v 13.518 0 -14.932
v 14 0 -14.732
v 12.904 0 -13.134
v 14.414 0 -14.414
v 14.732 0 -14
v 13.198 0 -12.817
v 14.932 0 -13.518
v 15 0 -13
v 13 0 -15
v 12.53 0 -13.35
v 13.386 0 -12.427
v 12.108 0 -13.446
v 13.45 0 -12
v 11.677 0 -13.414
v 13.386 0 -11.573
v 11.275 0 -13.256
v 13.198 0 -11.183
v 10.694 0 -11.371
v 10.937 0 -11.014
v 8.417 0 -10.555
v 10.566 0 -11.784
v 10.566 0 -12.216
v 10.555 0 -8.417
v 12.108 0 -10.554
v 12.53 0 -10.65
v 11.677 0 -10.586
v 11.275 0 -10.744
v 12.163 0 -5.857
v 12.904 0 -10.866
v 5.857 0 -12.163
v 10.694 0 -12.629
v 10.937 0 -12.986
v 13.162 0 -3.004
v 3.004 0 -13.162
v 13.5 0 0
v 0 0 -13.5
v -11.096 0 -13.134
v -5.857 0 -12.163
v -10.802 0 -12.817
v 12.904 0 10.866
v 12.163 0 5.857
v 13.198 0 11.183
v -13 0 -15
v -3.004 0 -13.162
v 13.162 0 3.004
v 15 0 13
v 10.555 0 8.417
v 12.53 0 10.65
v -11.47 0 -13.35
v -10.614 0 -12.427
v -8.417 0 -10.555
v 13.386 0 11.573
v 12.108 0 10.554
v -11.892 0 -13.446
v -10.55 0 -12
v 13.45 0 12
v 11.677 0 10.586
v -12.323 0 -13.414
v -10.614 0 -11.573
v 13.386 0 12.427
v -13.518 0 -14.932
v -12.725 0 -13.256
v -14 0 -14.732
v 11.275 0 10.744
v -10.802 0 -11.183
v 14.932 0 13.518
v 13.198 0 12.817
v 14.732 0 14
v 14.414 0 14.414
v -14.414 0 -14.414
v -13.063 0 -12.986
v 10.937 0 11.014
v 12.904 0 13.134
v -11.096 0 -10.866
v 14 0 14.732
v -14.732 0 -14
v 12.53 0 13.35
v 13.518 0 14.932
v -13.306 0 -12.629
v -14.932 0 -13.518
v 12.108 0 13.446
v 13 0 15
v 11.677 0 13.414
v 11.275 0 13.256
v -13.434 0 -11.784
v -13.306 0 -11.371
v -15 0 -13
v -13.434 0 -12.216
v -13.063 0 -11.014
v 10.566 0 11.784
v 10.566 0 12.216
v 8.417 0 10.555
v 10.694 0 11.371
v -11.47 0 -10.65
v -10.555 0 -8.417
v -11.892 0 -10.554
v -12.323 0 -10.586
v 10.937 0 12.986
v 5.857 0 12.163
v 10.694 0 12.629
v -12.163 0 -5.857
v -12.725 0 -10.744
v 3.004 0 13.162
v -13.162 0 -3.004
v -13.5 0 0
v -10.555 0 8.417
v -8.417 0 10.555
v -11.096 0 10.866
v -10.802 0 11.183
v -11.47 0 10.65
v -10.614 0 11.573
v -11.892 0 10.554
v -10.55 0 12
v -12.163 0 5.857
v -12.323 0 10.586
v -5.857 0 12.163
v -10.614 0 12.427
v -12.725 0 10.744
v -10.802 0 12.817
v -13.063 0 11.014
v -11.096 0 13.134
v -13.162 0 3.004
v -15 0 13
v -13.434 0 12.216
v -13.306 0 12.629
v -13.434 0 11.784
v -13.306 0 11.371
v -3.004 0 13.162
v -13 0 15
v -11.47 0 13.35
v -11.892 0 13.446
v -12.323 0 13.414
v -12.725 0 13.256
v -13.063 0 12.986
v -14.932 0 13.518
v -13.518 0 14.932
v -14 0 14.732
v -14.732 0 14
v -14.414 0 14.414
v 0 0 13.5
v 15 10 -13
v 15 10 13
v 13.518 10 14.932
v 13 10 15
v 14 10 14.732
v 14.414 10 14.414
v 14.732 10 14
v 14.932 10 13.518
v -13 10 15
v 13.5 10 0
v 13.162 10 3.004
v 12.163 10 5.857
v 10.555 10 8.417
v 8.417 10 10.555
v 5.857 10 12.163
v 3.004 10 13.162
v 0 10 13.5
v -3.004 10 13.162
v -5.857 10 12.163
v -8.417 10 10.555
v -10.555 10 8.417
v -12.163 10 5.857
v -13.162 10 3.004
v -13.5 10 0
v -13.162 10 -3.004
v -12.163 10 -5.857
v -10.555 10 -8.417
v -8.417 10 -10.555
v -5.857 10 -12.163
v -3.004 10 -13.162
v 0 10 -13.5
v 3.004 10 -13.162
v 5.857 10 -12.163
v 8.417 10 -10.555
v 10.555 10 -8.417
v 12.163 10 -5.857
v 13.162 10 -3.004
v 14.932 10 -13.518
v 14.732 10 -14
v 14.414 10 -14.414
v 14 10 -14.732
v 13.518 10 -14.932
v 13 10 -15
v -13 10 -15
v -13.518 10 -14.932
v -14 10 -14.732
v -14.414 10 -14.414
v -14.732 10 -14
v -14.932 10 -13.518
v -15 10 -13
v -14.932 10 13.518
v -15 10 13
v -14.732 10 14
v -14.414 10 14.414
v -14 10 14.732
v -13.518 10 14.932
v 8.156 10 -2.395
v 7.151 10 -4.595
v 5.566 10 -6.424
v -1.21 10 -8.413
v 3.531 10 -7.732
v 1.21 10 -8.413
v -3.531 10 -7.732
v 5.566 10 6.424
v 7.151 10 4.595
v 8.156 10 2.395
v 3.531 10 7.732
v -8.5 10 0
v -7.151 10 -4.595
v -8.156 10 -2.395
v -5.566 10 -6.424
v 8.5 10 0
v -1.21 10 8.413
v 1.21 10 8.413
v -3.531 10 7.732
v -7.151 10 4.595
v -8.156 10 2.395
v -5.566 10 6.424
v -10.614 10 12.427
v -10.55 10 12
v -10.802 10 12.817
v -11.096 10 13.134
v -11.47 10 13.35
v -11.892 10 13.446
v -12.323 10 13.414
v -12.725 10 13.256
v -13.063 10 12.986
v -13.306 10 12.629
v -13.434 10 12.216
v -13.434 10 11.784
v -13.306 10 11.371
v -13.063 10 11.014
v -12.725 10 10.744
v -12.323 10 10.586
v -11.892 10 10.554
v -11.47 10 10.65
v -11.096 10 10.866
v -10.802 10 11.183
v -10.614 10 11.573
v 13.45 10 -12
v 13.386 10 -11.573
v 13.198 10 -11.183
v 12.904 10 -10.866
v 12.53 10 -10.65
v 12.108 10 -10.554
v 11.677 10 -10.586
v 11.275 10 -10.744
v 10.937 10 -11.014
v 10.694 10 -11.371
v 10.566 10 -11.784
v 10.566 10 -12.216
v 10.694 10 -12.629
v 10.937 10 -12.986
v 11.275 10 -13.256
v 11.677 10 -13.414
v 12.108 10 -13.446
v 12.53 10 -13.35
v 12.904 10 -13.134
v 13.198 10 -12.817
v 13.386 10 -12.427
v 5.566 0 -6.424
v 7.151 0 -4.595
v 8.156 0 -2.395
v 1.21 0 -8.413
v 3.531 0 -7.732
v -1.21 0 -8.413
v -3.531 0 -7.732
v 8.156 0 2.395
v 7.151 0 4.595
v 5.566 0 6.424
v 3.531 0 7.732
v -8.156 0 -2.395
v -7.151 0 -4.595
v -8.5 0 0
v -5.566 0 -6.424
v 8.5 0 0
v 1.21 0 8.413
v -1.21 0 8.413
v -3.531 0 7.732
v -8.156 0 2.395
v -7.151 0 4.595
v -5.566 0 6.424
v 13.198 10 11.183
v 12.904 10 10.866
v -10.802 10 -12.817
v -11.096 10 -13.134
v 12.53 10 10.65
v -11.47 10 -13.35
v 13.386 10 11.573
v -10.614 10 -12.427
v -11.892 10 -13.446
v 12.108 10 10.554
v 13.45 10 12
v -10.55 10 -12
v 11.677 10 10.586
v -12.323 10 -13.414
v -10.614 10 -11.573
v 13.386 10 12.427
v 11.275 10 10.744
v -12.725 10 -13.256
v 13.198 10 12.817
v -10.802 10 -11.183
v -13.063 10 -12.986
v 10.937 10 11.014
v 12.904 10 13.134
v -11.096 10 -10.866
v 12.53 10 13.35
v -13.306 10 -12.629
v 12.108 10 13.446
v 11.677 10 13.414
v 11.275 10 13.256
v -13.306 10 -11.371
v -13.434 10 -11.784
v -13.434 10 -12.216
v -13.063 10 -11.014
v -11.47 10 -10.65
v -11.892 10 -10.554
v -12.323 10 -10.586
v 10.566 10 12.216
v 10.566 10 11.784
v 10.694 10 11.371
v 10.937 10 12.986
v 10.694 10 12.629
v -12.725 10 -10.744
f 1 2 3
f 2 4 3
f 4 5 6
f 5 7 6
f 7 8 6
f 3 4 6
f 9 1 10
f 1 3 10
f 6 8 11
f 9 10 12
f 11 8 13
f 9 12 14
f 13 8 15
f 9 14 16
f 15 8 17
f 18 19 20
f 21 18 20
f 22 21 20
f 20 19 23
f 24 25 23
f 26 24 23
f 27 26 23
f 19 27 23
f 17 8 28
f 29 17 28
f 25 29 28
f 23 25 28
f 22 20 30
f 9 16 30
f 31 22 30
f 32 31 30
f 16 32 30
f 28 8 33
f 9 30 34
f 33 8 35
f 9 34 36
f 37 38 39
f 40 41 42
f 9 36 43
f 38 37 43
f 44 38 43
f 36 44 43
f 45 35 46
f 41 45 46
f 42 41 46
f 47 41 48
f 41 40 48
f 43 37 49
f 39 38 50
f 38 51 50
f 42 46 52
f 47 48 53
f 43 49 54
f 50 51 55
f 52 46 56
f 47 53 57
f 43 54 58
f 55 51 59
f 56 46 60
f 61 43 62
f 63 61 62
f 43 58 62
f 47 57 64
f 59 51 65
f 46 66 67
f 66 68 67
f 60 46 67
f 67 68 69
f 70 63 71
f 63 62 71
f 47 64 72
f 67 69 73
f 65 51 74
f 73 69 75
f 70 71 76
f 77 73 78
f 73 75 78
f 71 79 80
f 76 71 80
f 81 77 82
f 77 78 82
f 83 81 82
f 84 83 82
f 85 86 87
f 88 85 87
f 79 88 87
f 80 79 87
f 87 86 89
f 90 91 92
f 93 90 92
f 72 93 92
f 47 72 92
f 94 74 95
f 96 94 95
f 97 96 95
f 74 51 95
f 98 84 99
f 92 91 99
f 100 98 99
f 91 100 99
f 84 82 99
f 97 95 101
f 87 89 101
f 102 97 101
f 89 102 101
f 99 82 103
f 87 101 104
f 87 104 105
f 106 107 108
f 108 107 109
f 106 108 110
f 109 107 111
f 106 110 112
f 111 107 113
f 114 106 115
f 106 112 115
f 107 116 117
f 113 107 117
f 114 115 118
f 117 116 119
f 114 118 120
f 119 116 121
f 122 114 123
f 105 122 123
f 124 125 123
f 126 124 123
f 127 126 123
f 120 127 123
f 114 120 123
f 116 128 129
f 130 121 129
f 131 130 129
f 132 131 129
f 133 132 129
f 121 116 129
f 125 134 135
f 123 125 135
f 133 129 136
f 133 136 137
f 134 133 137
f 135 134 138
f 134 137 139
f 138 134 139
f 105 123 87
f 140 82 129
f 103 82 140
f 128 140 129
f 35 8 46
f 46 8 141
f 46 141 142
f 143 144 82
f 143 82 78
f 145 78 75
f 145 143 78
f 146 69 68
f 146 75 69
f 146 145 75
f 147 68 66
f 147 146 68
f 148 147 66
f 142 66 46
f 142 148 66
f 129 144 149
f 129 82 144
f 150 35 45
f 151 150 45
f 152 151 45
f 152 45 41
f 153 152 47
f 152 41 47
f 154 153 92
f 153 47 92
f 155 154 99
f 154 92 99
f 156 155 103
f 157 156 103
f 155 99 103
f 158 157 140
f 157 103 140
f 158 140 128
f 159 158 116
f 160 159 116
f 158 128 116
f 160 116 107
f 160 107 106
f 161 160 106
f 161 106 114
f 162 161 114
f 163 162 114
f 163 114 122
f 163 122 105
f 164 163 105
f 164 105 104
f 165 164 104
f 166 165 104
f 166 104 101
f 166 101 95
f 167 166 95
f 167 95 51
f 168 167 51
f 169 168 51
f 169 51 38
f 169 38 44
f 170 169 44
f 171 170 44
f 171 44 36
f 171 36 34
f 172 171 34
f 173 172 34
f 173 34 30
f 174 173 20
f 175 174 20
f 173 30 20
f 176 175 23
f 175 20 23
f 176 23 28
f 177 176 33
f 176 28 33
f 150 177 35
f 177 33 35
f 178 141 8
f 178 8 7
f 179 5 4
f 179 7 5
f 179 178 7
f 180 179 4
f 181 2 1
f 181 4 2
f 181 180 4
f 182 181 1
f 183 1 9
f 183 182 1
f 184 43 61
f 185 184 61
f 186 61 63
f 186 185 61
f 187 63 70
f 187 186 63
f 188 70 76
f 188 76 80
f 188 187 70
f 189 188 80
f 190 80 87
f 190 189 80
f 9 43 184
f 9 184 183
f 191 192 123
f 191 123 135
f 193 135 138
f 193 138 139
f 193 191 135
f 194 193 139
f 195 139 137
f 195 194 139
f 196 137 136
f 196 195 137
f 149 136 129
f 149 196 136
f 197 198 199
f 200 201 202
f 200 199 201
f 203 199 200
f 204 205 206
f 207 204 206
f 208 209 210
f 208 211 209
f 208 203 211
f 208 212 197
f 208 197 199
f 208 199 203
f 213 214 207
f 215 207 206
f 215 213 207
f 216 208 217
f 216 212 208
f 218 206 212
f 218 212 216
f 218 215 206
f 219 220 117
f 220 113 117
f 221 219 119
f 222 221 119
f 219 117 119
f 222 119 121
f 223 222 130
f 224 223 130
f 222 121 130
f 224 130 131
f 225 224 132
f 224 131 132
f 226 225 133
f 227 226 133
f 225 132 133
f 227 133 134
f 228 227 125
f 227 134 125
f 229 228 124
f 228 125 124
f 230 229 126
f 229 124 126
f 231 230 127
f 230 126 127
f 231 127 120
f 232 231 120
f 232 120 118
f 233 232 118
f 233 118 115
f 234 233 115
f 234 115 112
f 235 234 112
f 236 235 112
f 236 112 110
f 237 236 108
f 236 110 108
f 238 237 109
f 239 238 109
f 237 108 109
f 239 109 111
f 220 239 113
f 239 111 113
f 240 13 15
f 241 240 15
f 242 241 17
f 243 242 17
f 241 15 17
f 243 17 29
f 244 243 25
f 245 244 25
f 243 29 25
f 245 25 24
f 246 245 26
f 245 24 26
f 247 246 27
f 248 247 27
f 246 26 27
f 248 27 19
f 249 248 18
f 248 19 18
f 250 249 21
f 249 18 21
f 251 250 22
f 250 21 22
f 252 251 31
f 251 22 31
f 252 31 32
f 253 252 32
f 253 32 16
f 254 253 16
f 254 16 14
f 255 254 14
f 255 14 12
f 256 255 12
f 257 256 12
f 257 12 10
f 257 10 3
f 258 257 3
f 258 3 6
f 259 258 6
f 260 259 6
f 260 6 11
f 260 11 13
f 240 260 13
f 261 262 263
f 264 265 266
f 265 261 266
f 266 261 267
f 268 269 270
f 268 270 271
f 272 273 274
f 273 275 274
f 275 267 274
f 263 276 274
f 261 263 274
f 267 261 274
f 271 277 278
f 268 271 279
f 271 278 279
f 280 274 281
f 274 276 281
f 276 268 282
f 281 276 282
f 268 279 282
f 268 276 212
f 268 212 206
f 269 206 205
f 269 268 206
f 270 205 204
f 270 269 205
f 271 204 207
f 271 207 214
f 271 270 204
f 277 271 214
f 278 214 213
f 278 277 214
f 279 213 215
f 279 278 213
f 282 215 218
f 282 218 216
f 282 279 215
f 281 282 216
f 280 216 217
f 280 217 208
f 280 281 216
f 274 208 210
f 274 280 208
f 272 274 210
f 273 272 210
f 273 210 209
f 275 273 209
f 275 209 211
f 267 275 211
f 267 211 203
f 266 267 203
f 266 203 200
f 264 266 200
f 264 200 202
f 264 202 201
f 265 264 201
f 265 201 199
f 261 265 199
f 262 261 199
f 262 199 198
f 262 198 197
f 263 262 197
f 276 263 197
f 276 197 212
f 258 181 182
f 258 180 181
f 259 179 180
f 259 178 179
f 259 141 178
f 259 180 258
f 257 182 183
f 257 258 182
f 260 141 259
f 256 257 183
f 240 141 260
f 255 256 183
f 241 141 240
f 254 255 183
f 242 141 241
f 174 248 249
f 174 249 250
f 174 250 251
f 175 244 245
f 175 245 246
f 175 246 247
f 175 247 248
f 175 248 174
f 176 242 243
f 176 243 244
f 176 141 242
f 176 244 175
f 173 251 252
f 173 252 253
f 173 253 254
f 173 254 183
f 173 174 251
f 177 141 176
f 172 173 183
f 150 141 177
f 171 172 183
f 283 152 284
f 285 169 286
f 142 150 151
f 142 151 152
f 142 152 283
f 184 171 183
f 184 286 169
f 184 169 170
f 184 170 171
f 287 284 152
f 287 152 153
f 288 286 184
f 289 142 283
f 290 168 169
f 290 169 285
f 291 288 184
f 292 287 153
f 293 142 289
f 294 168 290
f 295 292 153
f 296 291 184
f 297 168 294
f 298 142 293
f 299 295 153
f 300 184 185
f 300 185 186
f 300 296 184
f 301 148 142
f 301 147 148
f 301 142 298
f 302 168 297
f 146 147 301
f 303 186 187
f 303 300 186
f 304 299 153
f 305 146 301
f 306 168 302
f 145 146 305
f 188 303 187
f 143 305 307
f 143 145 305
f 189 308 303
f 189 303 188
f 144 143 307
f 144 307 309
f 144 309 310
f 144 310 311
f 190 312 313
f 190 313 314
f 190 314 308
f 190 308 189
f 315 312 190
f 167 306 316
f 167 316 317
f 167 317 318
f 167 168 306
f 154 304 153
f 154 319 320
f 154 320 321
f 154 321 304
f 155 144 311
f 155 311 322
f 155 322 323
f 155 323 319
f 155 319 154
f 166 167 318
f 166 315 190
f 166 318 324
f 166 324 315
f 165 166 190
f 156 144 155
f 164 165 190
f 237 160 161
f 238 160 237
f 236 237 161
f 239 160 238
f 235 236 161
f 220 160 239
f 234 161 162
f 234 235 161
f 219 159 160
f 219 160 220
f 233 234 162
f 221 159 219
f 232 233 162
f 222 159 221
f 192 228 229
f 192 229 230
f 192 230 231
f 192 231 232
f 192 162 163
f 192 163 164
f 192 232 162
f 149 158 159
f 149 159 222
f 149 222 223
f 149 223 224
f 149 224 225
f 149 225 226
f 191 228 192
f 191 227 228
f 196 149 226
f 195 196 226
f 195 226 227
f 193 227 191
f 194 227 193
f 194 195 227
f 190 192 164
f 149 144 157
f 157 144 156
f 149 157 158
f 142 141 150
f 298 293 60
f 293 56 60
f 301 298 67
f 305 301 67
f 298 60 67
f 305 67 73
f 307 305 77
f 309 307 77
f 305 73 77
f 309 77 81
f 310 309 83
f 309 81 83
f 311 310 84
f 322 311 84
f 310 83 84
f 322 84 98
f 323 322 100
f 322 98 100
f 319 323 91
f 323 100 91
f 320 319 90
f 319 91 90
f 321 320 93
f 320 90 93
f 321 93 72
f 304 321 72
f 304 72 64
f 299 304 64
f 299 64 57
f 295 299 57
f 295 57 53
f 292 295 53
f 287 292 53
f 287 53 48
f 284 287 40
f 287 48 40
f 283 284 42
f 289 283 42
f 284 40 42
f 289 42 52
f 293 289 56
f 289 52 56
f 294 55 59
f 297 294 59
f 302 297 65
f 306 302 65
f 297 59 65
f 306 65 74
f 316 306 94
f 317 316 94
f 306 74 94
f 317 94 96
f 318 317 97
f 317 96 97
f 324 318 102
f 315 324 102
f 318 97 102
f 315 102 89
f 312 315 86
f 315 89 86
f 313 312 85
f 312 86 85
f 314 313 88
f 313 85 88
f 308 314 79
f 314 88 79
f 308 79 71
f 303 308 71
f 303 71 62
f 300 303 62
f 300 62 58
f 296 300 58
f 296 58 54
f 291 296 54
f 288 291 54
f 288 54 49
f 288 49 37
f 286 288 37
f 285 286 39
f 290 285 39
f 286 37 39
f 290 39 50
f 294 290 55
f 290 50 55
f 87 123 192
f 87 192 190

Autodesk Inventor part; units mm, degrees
ref_plane "YZ Plane" through (0, 0, 0) normal (1, 0, 0) x (0, 1, 0)
ref_plane "XZ Plane" through (0, 0, 0) normal (0, 1, 0) x (-1, 0, 0)
ref_plane "XY Plane" through (0, 0, 0) normal (0, 0, 1) x (1, 0, 0)
sketch "Sketch1" plane through (0, 0, 0) normal (0, 1, 0) x (-1, 0, 0)
  line L0 (15, -15) -> (-15, -15)
  line L1 (-15, -15) -> (-15, 15)
  line L2 (-15, 15) -> (15, 15)
  line L3 (15, 15) -> (15, -15)
  line L4 (15, -15) -> (-15, 15) construction
  line L5 (-15, -15) -> (15, 15) construction
  point P0 (0, 0)
  dimension "d0" = 30
  dimension "d1" = 30
extrude "Extrusion1" add sketch "Sketch1" along normal blind 10
sketch "Sketch2" plane through (0, 0, 0) normal (0, -1, 0) x (1, 0, 0)
  line L0 (12, 12) -> (-12, 12) construction
  line L1 (-12, 12) -> (-12, -12) construction
  line L2 (-12, -12) -> (12, -12) construction
  line L3 (12, -12) -> (12, 12) construction
  line L4 (12, 12) -> (-12, -12) construction
  line L5 (-12, 12) -> (12, -12) construction
  circle A0 centre (12, 12) radius 1.45
  circle A1 centre (12, -12) radius 1.45
  circle A2 centre (-12, -12) radius 1.45
  circle A3 centre (-12, 12) radius 1.45
  circle A4 centre (0, 0) radius 13.5
  circle A5 centre (0, 0) radius 8.5
  dimension "d4" = 24
  dimension "d5" = 24
  dimension "d6" = 2.9
  dimension "d7" = 2.9
  dimension "d8" = 2.9
  dimension "d9" = 2.9
  dimension "d10" = 27
  dimension "d11" = 17
extrude "Extrusion2" cut sketch "Sketch2" against normal through all
fillet "Fillet1" radius 2 4 edges at (15, 5, 15) (-15, 5, 15) (15, 5, -15) (-15, 5, -15)
ref_plane "Work Plane1" through (13, 0, 0) normal (0, 0, -1) x (-1, 0, 0)
ref_plane "Work Plane2" through (0, 0, 13) normal (1, 0, 0) x (0, 0, -1)
properties part number "00_fan_30mm_24mm"
